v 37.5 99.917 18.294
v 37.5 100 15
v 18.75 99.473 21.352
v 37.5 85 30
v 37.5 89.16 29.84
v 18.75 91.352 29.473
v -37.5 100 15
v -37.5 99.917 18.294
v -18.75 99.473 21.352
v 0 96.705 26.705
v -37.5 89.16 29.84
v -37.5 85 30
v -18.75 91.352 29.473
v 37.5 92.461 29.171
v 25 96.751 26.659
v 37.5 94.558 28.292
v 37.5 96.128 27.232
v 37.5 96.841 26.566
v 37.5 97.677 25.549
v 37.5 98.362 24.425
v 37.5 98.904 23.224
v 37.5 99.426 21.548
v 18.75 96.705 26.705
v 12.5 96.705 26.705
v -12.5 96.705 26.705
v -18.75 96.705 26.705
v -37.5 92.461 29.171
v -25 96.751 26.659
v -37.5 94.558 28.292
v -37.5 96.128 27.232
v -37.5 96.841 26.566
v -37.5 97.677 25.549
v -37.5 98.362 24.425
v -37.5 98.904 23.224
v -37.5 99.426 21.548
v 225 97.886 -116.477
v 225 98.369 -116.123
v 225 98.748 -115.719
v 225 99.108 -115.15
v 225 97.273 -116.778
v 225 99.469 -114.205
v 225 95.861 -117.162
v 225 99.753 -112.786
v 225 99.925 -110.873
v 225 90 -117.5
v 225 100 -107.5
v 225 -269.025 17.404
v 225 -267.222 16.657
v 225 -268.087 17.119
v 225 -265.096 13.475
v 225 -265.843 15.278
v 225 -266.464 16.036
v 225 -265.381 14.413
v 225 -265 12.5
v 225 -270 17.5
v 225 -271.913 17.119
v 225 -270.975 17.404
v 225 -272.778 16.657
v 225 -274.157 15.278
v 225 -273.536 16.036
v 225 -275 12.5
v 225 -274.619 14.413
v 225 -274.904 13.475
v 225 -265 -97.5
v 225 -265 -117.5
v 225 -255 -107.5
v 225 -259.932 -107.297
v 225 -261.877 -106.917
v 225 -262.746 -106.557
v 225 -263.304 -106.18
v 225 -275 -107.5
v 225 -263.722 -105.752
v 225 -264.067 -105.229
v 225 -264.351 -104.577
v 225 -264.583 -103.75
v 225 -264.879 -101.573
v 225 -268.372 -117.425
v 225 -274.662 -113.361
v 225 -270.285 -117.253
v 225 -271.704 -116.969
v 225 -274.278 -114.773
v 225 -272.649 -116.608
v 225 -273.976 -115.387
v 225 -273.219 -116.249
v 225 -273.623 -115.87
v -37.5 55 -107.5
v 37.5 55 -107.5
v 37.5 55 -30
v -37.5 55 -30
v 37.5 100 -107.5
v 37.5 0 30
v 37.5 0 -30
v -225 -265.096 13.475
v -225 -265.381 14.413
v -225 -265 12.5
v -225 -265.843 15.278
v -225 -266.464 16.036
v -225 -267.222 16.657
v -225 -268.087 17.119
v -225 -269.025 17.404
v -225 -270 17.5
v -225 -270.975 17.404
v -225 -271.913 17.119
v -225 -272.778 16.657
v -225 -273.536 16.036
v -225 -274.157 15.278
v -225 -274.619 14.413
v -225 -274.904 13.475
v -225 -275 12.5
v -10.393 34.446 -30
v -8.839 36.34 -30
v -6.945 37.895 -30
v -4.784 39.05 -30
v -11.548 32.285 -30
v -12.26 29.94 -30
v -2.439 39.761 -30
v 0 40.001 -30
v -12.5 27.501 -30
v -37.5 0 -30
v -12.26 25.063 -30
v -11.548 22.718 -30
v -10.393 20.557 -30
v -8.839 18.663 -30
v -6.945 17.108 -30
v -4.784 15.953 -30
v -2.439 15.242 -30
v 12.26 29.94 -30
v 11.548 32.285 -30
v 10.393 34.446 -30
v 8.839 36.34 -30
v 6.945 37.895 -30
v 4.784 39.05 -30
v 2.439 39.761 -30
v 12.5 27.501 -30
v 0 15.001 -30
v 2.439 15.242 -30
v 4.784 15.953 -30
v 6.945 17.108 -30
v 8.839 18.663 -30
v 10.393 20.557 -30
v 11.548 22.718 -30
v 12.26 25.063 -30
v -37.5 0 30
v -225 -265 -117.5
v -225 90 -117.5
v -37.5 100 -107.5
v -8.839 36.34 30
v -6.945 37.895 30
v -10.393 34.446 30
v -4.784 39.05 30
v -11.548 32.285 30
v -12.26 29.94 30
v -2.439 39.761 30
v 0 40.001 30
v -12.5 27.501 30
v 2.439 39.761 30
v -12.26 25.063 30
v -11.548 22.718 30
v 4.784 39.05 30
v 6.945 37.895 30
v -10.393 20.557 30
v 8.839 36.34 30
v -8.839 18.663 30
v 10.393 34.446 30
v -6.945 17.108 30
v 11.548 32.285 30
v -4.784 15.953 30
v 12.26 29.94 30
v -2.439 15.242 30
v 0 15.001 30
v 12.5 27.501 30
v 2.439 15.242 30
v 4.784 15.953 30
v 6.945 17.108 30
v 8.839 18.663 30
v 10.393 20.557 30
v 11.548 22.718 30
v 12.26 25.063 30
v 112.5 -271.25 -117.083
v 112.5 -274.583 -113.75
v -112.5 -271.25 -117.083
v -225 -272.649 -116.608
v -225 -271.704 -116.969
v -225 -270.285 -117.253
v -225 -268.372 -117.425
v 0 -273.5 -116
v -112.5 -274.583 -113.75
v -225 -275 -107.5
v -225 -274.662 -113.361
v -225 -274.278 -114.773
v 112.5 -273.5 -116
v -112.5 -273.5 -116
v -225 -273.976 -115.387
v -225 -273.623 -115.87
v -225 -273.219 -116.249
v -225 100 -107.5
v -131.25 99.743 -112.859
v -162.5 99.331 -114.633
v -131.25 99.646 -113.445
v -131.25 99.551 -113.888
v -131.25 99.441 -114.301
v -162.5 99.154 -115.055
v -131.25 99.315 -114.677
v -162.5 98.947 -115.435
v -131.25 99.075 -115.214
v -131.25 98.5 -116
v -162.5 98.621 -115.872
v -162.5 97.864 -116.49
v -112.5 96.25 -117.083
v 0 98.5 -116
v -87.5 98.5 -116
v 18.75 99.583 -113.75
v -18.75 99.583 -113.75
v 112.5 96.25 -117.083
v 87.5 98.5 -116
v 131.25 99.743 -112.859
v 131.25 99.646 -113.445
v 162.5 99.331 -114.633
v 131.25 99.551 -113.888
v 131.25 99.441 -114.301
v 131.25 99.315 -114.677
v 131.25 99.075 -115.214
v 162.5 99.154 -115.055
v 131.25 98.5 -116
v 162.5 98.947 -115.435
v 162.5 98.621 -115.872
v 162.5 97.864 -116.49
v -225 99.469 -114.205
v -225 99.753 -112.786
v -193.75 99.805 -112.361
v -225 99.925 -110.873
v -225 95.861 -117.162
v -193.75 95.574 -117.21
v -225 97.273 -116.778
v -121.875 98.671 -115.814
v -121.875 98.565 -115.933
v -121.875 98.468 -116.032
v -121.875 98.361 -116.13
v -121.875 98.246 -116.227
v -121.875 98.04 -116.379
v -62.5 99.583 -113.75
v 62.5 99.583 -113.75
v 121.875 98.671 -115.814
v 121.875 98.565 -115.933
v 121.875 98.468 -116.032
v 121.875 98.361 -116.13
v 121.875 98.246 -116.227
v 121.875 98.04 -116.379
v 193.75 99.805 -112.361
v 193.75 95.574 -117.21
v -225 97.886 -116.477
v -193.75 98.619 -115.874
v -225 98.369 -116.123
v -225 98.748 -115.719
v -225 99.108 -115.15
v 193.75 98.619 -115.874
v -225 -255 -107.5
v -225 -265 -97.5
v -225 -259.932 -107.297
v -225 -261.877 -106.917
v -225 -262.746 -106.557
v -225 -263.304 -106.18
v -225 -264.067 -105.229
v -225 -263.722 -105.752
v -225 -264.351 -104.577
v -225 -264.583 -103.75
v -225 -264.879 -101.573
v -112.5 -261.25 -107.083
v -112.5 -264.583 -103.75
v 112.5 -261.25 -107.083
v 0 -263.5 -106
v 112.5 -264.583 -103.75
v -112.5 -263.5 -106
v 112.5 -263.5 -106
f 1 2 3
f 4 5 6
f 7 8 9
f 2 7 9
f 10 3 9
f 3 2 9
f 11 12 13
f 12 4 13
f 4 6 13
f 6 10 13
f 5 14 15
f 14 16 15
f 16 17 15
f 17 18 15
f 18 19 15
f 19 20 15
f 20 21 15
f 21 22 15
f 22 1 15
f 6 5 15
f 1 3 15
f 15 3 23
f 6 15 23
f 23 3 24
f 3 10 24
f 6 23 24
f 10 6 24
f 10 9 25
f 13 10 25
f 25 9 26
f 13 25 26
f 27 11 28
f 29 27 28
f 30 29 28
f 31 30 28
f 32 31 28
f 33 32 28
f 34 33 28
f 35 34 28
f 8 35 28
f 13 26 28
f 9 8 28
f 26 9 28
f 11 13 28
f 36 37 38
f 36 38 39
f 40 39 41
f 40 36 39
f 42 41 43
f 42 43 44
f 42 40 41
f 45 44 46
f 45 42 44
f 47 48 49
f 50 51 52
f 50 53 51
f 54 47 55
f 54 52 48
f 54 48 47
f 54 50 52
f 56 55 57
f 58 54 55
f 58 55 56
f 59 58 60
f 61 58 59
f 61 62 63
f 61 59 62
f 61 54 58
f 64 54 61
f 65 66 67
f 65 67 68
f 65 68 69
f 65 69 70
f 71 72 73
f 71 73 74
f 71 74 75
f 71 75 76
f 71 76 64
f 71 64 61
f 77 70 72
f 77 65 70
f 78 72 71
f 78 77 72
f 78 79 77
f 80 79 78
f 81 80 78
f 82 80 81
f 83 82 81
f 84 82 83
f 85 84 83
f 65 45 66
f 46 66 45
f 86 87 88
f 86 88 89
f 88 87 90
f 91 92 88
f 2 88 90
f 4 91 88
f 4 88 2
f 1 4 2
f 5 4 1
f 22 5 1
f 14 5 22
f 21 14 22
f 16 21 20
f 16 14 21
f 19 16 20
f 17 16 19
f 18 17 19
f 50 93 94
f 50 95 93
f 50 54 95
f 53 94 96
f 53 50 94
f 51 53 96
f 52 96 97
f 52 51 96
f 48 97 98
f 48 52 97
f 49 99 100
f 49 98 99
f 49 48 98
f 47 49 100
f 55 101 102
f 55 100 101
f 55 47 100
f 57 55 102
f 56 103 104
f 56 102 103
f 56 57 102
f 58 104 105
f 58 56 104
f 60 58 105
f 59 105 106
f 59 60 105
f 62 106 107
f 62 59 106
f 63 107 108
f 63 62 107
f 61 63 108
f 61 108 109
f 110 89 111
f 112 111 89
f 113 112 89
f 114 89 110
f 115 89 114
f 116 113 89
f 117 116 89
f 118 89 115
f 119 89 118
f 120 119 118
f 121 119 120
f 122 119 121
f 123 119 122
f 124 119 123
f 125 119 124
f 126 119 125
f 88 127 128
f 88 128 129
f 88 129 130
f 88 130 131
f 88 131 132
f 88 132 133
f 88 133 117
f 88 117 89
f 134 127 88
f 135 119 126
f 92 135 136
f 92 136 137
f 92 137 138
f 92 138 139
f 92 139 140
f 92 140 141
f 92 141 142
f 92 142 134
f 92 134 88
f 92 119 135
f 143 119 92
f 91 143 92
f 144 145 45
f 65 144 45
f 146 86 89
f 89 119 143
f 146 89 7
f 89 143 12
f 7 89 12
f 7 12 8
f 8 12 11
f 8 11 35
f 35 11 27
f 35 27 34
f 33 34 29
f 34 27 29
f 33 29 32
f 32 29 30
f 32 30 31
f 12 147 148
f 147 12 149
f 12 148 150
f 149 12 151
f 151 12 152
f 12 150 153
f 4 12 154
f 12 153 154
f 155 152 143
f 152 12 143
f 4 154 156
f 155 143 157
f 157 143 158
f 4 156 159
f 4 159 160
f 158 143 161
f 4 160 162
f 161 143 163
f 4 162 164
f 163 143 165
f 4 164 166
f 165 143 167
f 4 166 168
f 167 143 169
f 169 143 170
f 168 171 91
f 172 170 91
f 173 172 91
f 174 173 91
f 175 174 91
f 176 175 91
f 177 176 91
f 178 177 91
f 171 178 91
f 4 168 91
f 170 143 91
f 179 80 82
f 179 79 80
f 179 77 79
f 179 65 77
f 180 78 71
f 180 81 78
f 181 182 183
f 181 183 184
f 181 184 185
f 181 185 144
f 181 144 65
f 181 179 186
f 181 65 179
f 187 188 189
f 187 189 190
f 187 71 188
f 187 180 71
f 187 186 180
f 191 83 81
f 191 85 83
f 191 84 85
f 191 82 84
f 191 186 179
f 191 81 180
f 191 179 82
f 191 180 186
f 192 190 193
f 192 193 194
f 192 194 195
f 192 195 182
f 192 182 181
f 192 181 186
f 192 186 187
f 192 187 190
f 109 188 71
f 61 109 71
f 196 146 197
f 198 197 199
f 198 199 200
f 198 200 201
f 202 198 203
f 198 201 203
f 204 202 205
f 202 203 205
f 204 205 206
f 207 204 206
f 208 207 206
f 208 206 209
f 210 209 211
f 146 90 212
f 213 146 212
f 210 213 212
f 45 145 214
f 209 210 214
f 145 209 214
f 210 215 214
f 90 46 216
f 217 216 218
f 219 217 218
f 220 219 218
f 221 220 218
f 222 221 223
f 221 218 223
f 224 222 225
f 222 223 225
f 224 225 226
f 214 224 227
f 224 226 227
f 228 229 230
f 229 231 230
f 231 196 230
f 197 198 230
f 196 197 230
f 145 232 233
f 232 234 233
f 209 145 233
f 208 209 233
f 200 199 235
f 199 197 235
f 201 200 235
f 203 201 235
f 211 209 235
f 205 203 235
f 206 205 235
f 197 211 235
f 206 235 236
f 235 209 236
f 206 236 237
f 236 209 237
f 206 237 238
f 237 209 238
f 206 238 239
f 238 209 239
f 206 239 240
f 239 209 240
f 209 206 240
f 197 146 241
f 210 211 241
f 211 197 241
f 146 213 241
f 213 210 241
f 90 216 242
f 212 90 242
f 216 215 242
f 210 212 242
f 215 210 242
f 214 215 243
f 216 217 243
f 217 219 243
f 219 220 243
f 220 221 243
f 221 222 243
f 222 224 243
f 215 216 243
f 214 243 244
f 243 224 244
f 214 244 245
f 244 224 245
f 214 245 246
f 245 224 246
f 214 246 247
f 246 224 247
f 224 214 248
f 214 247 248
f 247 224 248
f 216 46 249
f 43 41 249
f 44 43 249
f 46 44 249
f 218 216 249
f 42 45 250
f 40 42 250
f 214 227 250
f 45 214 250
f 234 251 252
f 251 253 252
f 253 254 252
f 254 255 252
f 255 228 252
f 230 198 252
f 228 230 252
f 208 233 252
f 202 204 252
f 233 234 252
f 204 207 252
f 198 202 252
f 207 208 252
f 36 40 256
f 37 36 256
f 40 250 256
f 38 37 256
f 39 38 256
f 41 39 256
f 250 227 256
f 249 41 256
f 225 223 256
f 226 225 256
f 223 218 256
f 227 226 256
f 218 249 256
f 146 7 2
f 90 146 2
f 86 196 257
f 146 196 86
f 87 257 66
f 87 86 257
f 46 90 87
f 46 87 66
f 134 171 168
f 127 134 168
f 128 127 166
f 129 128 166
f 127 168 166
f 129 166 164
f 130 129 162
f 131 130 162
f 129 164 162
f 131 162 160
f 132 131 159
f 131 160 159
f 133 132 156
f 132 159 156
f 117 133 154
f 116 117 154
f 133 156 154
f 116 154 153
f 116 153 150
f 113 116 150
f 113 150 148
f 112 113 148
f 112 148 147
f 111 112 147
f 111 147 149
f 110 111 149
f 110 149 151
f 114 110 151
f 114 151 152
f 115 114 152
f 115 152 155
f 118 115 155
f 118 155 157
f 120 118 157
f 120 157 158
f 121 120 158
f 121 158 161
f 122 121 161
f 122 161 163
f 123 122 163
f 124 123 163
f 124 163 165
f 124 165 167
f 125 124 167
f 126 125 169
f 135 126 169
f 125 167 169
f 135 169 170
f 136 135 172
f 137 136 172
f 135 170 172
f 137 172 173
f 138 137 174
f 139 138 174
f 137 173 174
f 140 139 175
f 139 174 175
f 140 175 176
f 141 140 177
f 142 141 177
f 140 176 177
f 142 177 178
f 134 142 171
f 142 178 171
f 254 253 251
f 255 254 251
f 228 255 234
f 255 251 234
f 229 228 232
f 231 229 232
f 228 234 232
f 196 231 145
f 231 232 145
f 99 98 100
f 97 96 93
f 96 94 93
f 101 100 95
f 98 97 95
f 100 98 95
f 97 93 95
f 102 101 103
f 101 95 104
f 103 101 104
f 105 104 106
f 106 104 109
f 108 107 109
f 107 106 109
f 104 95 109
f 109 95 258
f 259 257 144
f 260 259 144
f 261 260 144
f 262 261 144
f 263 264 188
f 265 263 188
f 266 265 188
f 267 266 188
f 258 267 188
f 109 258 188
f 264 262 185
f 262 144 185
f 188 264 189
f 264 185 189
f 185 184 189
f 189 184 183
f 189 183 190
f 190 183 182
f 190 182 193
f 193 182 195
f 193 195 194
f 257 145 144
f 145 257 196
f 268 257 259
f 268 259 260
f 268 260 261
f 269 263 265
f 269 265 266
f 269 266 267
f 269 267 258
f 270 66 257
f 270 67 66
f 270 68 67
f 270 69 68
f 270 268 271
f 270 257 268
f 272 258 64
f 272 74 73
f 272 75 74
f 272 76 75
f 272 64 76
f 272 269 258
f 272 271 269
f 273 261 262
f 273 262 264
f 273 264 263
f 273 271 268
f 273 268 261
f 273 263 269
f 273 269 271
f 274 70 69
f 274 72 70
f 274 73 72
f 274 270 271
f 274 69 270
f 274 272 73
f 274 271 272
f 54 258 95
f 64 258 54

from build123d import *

# Parameters (mm, degrees)
SKETCH1_W           = 75
SKETCH1_H           = 60
BOSS_EXTRUDE2_DEPTH = 100
SKETCH2_W           = 75
SKETCH2_H           = 45
BOSS_EXTRUDE3_DEPTH = 77.5
BOSS_EXTRUDE4_DEPTH = 10
SKETCH4_W           = 450
SKETCH4_H           = 10
BOSS_EXTRUDE5_DEPTH = 125
SKETCH5_R           = 12.5
CUT_EXTRUDE1_DEPTH  = 125
FILLET3_SIZE        = 10
FILLET4_RADIUS      = 5
FILLET4_LENGTH      = 450
FILLET5_SIZE        = 10
FILLET6_SIZE        = 15


with BuildPart() as part:
    # Sketch1 → Boss-Extrude2 (new body)
    with BuildSketch(Plane(origin=(0, 0, 0), x_dir=(1, 0, 0), z_dir=(0, 1, 0))):
        Rectangle(SKETCH1_W, SKETCH1_H)
    extrude(amount=BOSS_EXTRUDE2_DEPTH)

    # Sketch2 → Boss-Extrude3 (add)
    with BuildSketch(Plane(origin=(0, 0, -30), x_dir=(-1, 0, 0), z_dir=(0, 0, -1))):
        with Locations((0, 77.5)):
            Rectangle(SKETCH2_W, SKETCH2_H)
    extrude(amount=BOSS_EXTRUDE3_DEPTH)

    # Sketch3 → Boss-Extrude4 (add)
    with BuildSketch(Plane(origin=(0, 0, -107.5), x_dir=(-1, 0, 0), z_dir=(0, 0, -1))):
        Polygon((0, 100), (225, 100), (225, -275), (25, -275), (-225, -275), (-225, 100), align=None)
    extrude(amount=BOSS_EXTRUDE4_DEPTH)

    # Sketch4 → Boss-Extrude5 (add)
    with BuildSketch(Plane.XY.offset(-107.5)):
        with Locations((0, -270)):
            Rectangle(SKETCH4_W, SKETCH4_H)
    extrude(amount=BOSS_EXTRUDE5_DEPTH)

    # Sketch5 → Cut-Extrude1 (cut)
    with BuildSketch(Plane.XY.offset(30)):
        with Locations((0, 27.501368098)):
            Circle(SKETCH5_R)
    extrude(amount=-CUT_EXTRUDE1_DEPTH, mode=Mode.SUBTRACT)

    # Fillet3
    # a fillet whose section is not a circle: 10 mm, written as the material it takes off along each edge
    with BuildSketch(Plane(origin=(-250, -275, -117.5), x_dir=(0, 1, 0), z_dir=(1, 0, 0))) as fillet3_piece_1:
        with BuildLine():
            Bezier((FILLET3_SIZE, 0), (0, 0), (0, FILLET3_SIZE), weights=[1, 2.333333333, 1])
            Line((0, FILLET3_SIZE), (0, 0))
            Line((0, 0), (FILLET3_SIZE, 0))
        make_face()
    extrude(amount=500, mode=Mode.SUBTRACT)
    with BuildSketch(Plane(origin=(250, 100, -117.5), x_dir=(0, 0, 1), z_dir=(-1, 0, 0))) as fillet3_piece_2:
        with BuildLine():
            Bezier((FILLET3_SIZE, 0), (0, 0), (0, -FILLET3_SIZE), weights=[1, 2.333333333, 1])
            Line((0, -FILLET3_SIZE), (0, 0))
            Line((0, 0), (FILLET3_SIZE, 0))
        make_face()
    extrude(amount=500, mode=Mode.SUBTRACT)

    # Fillet4: full round fillet: the end face becomes a half cylinder, R = half its width
    fillet4_face = Plane((0, -270, 17.5), x_dir=(1, 0, 0), z_dir=(0, 0, 1))  # on the end face: x along it, z out of the body
    fillet4_slab = fillet4_face.offset(-FILLET4_RADIUS / 2) * Box(FILLET4_LENGTH, 2 * FILLET4_RADIUS, FILLET4_RADIUS, mode=Mode.PRIVATE)  # the body's end, R deep
    fillet4_round = Plane((0, -270, 12.5), x_dir=(0, 0, 1), z_dir=(1, 0, 0)) * Cylinder(FILLET4_RADIUS, FILLET4_LENGTH, mode=Mode.PRIVATE)  # its axis R under the face
    add(fillet4_slab - fillet4_round, mode=Mode.SUBTRACT)

    # Fillet5
    # a fillet whose section is not a circle: 10 mm, written as the material it adds along each edge
    with BuildSketch(Plane(origin=(225, -265, -107.5), x_dir=(0, 1, 0), z_dir=(-1, 0, 0))) as fillet5_piece_1:
        with BuildLine():
            Bezier((FILLET5_SIZE, 0), (0, 0), (0, -FILLET5_SIZE), weights=[1, 2.333333333, 1])
            Line((0, -FILLET5_SIZE), (-FILLET5_SIZE * 0.02, -FILLET5_SIZE))
            Line((-FILLET5_SIZE * 0.02, -FILLET5_SIZE), (-FILLET5_SIZE * 0.02, FILLET5_SIZE * 0.02))
            Line((-FILLET5_SIZE * 0.02, FILLET5_SIZE * 0.02), (FILLET5_SIZE, FILLET5_SIZE * 0.02))
            Line((FILLET5_SIZE, FILLET5_SIZE * 0.02), (FILLET5_SIZE, 0))
        make_face()
    extrude(amount=450)

    # Fillet6
    # a fillet whose section is not a circle: 15 mm, written as the material it takes off along each edge
    with BuildSketch(Plane(origin=(-75, 100, 30), x_dir=(0, 0, -1), z_dir=(1, 0, 0))) as fillet6_piece_1:
        with BuildLine():
            add(Edge.make_bspline([(FILLET6_SIZE, 0), (FILLET6_SIZE * 0.831801948466, 0), (FILLET6_SIZE * 0.663603896932, 0), (FILLET6_SIZE * 0.292893218813, -FILLET6_SIZE * 0.0716919198361), (FILLET6_SIZE * 0.0716919198361, -FILLET6_SIZE * 0.292893218813), (0, -FILLET6_SIZE * 0.663603896932), (0, -FILLET6_SIZE * 0.831801948466), (0, -FILLET6_SIZE)], knots=[0, 0, 0, 0, 0, 0, 0.5, 0.5, 1, 1, 1, 1, 1, 1], degree=5))
            Line((0, -FILLET6_SIZE), (0, 0))
            Line((0, 0), (FILLET6_SIZE, 0))
        make_face()
    extrude(amount=150, mode=Mode.SUBTRACT)


solid = part.part
